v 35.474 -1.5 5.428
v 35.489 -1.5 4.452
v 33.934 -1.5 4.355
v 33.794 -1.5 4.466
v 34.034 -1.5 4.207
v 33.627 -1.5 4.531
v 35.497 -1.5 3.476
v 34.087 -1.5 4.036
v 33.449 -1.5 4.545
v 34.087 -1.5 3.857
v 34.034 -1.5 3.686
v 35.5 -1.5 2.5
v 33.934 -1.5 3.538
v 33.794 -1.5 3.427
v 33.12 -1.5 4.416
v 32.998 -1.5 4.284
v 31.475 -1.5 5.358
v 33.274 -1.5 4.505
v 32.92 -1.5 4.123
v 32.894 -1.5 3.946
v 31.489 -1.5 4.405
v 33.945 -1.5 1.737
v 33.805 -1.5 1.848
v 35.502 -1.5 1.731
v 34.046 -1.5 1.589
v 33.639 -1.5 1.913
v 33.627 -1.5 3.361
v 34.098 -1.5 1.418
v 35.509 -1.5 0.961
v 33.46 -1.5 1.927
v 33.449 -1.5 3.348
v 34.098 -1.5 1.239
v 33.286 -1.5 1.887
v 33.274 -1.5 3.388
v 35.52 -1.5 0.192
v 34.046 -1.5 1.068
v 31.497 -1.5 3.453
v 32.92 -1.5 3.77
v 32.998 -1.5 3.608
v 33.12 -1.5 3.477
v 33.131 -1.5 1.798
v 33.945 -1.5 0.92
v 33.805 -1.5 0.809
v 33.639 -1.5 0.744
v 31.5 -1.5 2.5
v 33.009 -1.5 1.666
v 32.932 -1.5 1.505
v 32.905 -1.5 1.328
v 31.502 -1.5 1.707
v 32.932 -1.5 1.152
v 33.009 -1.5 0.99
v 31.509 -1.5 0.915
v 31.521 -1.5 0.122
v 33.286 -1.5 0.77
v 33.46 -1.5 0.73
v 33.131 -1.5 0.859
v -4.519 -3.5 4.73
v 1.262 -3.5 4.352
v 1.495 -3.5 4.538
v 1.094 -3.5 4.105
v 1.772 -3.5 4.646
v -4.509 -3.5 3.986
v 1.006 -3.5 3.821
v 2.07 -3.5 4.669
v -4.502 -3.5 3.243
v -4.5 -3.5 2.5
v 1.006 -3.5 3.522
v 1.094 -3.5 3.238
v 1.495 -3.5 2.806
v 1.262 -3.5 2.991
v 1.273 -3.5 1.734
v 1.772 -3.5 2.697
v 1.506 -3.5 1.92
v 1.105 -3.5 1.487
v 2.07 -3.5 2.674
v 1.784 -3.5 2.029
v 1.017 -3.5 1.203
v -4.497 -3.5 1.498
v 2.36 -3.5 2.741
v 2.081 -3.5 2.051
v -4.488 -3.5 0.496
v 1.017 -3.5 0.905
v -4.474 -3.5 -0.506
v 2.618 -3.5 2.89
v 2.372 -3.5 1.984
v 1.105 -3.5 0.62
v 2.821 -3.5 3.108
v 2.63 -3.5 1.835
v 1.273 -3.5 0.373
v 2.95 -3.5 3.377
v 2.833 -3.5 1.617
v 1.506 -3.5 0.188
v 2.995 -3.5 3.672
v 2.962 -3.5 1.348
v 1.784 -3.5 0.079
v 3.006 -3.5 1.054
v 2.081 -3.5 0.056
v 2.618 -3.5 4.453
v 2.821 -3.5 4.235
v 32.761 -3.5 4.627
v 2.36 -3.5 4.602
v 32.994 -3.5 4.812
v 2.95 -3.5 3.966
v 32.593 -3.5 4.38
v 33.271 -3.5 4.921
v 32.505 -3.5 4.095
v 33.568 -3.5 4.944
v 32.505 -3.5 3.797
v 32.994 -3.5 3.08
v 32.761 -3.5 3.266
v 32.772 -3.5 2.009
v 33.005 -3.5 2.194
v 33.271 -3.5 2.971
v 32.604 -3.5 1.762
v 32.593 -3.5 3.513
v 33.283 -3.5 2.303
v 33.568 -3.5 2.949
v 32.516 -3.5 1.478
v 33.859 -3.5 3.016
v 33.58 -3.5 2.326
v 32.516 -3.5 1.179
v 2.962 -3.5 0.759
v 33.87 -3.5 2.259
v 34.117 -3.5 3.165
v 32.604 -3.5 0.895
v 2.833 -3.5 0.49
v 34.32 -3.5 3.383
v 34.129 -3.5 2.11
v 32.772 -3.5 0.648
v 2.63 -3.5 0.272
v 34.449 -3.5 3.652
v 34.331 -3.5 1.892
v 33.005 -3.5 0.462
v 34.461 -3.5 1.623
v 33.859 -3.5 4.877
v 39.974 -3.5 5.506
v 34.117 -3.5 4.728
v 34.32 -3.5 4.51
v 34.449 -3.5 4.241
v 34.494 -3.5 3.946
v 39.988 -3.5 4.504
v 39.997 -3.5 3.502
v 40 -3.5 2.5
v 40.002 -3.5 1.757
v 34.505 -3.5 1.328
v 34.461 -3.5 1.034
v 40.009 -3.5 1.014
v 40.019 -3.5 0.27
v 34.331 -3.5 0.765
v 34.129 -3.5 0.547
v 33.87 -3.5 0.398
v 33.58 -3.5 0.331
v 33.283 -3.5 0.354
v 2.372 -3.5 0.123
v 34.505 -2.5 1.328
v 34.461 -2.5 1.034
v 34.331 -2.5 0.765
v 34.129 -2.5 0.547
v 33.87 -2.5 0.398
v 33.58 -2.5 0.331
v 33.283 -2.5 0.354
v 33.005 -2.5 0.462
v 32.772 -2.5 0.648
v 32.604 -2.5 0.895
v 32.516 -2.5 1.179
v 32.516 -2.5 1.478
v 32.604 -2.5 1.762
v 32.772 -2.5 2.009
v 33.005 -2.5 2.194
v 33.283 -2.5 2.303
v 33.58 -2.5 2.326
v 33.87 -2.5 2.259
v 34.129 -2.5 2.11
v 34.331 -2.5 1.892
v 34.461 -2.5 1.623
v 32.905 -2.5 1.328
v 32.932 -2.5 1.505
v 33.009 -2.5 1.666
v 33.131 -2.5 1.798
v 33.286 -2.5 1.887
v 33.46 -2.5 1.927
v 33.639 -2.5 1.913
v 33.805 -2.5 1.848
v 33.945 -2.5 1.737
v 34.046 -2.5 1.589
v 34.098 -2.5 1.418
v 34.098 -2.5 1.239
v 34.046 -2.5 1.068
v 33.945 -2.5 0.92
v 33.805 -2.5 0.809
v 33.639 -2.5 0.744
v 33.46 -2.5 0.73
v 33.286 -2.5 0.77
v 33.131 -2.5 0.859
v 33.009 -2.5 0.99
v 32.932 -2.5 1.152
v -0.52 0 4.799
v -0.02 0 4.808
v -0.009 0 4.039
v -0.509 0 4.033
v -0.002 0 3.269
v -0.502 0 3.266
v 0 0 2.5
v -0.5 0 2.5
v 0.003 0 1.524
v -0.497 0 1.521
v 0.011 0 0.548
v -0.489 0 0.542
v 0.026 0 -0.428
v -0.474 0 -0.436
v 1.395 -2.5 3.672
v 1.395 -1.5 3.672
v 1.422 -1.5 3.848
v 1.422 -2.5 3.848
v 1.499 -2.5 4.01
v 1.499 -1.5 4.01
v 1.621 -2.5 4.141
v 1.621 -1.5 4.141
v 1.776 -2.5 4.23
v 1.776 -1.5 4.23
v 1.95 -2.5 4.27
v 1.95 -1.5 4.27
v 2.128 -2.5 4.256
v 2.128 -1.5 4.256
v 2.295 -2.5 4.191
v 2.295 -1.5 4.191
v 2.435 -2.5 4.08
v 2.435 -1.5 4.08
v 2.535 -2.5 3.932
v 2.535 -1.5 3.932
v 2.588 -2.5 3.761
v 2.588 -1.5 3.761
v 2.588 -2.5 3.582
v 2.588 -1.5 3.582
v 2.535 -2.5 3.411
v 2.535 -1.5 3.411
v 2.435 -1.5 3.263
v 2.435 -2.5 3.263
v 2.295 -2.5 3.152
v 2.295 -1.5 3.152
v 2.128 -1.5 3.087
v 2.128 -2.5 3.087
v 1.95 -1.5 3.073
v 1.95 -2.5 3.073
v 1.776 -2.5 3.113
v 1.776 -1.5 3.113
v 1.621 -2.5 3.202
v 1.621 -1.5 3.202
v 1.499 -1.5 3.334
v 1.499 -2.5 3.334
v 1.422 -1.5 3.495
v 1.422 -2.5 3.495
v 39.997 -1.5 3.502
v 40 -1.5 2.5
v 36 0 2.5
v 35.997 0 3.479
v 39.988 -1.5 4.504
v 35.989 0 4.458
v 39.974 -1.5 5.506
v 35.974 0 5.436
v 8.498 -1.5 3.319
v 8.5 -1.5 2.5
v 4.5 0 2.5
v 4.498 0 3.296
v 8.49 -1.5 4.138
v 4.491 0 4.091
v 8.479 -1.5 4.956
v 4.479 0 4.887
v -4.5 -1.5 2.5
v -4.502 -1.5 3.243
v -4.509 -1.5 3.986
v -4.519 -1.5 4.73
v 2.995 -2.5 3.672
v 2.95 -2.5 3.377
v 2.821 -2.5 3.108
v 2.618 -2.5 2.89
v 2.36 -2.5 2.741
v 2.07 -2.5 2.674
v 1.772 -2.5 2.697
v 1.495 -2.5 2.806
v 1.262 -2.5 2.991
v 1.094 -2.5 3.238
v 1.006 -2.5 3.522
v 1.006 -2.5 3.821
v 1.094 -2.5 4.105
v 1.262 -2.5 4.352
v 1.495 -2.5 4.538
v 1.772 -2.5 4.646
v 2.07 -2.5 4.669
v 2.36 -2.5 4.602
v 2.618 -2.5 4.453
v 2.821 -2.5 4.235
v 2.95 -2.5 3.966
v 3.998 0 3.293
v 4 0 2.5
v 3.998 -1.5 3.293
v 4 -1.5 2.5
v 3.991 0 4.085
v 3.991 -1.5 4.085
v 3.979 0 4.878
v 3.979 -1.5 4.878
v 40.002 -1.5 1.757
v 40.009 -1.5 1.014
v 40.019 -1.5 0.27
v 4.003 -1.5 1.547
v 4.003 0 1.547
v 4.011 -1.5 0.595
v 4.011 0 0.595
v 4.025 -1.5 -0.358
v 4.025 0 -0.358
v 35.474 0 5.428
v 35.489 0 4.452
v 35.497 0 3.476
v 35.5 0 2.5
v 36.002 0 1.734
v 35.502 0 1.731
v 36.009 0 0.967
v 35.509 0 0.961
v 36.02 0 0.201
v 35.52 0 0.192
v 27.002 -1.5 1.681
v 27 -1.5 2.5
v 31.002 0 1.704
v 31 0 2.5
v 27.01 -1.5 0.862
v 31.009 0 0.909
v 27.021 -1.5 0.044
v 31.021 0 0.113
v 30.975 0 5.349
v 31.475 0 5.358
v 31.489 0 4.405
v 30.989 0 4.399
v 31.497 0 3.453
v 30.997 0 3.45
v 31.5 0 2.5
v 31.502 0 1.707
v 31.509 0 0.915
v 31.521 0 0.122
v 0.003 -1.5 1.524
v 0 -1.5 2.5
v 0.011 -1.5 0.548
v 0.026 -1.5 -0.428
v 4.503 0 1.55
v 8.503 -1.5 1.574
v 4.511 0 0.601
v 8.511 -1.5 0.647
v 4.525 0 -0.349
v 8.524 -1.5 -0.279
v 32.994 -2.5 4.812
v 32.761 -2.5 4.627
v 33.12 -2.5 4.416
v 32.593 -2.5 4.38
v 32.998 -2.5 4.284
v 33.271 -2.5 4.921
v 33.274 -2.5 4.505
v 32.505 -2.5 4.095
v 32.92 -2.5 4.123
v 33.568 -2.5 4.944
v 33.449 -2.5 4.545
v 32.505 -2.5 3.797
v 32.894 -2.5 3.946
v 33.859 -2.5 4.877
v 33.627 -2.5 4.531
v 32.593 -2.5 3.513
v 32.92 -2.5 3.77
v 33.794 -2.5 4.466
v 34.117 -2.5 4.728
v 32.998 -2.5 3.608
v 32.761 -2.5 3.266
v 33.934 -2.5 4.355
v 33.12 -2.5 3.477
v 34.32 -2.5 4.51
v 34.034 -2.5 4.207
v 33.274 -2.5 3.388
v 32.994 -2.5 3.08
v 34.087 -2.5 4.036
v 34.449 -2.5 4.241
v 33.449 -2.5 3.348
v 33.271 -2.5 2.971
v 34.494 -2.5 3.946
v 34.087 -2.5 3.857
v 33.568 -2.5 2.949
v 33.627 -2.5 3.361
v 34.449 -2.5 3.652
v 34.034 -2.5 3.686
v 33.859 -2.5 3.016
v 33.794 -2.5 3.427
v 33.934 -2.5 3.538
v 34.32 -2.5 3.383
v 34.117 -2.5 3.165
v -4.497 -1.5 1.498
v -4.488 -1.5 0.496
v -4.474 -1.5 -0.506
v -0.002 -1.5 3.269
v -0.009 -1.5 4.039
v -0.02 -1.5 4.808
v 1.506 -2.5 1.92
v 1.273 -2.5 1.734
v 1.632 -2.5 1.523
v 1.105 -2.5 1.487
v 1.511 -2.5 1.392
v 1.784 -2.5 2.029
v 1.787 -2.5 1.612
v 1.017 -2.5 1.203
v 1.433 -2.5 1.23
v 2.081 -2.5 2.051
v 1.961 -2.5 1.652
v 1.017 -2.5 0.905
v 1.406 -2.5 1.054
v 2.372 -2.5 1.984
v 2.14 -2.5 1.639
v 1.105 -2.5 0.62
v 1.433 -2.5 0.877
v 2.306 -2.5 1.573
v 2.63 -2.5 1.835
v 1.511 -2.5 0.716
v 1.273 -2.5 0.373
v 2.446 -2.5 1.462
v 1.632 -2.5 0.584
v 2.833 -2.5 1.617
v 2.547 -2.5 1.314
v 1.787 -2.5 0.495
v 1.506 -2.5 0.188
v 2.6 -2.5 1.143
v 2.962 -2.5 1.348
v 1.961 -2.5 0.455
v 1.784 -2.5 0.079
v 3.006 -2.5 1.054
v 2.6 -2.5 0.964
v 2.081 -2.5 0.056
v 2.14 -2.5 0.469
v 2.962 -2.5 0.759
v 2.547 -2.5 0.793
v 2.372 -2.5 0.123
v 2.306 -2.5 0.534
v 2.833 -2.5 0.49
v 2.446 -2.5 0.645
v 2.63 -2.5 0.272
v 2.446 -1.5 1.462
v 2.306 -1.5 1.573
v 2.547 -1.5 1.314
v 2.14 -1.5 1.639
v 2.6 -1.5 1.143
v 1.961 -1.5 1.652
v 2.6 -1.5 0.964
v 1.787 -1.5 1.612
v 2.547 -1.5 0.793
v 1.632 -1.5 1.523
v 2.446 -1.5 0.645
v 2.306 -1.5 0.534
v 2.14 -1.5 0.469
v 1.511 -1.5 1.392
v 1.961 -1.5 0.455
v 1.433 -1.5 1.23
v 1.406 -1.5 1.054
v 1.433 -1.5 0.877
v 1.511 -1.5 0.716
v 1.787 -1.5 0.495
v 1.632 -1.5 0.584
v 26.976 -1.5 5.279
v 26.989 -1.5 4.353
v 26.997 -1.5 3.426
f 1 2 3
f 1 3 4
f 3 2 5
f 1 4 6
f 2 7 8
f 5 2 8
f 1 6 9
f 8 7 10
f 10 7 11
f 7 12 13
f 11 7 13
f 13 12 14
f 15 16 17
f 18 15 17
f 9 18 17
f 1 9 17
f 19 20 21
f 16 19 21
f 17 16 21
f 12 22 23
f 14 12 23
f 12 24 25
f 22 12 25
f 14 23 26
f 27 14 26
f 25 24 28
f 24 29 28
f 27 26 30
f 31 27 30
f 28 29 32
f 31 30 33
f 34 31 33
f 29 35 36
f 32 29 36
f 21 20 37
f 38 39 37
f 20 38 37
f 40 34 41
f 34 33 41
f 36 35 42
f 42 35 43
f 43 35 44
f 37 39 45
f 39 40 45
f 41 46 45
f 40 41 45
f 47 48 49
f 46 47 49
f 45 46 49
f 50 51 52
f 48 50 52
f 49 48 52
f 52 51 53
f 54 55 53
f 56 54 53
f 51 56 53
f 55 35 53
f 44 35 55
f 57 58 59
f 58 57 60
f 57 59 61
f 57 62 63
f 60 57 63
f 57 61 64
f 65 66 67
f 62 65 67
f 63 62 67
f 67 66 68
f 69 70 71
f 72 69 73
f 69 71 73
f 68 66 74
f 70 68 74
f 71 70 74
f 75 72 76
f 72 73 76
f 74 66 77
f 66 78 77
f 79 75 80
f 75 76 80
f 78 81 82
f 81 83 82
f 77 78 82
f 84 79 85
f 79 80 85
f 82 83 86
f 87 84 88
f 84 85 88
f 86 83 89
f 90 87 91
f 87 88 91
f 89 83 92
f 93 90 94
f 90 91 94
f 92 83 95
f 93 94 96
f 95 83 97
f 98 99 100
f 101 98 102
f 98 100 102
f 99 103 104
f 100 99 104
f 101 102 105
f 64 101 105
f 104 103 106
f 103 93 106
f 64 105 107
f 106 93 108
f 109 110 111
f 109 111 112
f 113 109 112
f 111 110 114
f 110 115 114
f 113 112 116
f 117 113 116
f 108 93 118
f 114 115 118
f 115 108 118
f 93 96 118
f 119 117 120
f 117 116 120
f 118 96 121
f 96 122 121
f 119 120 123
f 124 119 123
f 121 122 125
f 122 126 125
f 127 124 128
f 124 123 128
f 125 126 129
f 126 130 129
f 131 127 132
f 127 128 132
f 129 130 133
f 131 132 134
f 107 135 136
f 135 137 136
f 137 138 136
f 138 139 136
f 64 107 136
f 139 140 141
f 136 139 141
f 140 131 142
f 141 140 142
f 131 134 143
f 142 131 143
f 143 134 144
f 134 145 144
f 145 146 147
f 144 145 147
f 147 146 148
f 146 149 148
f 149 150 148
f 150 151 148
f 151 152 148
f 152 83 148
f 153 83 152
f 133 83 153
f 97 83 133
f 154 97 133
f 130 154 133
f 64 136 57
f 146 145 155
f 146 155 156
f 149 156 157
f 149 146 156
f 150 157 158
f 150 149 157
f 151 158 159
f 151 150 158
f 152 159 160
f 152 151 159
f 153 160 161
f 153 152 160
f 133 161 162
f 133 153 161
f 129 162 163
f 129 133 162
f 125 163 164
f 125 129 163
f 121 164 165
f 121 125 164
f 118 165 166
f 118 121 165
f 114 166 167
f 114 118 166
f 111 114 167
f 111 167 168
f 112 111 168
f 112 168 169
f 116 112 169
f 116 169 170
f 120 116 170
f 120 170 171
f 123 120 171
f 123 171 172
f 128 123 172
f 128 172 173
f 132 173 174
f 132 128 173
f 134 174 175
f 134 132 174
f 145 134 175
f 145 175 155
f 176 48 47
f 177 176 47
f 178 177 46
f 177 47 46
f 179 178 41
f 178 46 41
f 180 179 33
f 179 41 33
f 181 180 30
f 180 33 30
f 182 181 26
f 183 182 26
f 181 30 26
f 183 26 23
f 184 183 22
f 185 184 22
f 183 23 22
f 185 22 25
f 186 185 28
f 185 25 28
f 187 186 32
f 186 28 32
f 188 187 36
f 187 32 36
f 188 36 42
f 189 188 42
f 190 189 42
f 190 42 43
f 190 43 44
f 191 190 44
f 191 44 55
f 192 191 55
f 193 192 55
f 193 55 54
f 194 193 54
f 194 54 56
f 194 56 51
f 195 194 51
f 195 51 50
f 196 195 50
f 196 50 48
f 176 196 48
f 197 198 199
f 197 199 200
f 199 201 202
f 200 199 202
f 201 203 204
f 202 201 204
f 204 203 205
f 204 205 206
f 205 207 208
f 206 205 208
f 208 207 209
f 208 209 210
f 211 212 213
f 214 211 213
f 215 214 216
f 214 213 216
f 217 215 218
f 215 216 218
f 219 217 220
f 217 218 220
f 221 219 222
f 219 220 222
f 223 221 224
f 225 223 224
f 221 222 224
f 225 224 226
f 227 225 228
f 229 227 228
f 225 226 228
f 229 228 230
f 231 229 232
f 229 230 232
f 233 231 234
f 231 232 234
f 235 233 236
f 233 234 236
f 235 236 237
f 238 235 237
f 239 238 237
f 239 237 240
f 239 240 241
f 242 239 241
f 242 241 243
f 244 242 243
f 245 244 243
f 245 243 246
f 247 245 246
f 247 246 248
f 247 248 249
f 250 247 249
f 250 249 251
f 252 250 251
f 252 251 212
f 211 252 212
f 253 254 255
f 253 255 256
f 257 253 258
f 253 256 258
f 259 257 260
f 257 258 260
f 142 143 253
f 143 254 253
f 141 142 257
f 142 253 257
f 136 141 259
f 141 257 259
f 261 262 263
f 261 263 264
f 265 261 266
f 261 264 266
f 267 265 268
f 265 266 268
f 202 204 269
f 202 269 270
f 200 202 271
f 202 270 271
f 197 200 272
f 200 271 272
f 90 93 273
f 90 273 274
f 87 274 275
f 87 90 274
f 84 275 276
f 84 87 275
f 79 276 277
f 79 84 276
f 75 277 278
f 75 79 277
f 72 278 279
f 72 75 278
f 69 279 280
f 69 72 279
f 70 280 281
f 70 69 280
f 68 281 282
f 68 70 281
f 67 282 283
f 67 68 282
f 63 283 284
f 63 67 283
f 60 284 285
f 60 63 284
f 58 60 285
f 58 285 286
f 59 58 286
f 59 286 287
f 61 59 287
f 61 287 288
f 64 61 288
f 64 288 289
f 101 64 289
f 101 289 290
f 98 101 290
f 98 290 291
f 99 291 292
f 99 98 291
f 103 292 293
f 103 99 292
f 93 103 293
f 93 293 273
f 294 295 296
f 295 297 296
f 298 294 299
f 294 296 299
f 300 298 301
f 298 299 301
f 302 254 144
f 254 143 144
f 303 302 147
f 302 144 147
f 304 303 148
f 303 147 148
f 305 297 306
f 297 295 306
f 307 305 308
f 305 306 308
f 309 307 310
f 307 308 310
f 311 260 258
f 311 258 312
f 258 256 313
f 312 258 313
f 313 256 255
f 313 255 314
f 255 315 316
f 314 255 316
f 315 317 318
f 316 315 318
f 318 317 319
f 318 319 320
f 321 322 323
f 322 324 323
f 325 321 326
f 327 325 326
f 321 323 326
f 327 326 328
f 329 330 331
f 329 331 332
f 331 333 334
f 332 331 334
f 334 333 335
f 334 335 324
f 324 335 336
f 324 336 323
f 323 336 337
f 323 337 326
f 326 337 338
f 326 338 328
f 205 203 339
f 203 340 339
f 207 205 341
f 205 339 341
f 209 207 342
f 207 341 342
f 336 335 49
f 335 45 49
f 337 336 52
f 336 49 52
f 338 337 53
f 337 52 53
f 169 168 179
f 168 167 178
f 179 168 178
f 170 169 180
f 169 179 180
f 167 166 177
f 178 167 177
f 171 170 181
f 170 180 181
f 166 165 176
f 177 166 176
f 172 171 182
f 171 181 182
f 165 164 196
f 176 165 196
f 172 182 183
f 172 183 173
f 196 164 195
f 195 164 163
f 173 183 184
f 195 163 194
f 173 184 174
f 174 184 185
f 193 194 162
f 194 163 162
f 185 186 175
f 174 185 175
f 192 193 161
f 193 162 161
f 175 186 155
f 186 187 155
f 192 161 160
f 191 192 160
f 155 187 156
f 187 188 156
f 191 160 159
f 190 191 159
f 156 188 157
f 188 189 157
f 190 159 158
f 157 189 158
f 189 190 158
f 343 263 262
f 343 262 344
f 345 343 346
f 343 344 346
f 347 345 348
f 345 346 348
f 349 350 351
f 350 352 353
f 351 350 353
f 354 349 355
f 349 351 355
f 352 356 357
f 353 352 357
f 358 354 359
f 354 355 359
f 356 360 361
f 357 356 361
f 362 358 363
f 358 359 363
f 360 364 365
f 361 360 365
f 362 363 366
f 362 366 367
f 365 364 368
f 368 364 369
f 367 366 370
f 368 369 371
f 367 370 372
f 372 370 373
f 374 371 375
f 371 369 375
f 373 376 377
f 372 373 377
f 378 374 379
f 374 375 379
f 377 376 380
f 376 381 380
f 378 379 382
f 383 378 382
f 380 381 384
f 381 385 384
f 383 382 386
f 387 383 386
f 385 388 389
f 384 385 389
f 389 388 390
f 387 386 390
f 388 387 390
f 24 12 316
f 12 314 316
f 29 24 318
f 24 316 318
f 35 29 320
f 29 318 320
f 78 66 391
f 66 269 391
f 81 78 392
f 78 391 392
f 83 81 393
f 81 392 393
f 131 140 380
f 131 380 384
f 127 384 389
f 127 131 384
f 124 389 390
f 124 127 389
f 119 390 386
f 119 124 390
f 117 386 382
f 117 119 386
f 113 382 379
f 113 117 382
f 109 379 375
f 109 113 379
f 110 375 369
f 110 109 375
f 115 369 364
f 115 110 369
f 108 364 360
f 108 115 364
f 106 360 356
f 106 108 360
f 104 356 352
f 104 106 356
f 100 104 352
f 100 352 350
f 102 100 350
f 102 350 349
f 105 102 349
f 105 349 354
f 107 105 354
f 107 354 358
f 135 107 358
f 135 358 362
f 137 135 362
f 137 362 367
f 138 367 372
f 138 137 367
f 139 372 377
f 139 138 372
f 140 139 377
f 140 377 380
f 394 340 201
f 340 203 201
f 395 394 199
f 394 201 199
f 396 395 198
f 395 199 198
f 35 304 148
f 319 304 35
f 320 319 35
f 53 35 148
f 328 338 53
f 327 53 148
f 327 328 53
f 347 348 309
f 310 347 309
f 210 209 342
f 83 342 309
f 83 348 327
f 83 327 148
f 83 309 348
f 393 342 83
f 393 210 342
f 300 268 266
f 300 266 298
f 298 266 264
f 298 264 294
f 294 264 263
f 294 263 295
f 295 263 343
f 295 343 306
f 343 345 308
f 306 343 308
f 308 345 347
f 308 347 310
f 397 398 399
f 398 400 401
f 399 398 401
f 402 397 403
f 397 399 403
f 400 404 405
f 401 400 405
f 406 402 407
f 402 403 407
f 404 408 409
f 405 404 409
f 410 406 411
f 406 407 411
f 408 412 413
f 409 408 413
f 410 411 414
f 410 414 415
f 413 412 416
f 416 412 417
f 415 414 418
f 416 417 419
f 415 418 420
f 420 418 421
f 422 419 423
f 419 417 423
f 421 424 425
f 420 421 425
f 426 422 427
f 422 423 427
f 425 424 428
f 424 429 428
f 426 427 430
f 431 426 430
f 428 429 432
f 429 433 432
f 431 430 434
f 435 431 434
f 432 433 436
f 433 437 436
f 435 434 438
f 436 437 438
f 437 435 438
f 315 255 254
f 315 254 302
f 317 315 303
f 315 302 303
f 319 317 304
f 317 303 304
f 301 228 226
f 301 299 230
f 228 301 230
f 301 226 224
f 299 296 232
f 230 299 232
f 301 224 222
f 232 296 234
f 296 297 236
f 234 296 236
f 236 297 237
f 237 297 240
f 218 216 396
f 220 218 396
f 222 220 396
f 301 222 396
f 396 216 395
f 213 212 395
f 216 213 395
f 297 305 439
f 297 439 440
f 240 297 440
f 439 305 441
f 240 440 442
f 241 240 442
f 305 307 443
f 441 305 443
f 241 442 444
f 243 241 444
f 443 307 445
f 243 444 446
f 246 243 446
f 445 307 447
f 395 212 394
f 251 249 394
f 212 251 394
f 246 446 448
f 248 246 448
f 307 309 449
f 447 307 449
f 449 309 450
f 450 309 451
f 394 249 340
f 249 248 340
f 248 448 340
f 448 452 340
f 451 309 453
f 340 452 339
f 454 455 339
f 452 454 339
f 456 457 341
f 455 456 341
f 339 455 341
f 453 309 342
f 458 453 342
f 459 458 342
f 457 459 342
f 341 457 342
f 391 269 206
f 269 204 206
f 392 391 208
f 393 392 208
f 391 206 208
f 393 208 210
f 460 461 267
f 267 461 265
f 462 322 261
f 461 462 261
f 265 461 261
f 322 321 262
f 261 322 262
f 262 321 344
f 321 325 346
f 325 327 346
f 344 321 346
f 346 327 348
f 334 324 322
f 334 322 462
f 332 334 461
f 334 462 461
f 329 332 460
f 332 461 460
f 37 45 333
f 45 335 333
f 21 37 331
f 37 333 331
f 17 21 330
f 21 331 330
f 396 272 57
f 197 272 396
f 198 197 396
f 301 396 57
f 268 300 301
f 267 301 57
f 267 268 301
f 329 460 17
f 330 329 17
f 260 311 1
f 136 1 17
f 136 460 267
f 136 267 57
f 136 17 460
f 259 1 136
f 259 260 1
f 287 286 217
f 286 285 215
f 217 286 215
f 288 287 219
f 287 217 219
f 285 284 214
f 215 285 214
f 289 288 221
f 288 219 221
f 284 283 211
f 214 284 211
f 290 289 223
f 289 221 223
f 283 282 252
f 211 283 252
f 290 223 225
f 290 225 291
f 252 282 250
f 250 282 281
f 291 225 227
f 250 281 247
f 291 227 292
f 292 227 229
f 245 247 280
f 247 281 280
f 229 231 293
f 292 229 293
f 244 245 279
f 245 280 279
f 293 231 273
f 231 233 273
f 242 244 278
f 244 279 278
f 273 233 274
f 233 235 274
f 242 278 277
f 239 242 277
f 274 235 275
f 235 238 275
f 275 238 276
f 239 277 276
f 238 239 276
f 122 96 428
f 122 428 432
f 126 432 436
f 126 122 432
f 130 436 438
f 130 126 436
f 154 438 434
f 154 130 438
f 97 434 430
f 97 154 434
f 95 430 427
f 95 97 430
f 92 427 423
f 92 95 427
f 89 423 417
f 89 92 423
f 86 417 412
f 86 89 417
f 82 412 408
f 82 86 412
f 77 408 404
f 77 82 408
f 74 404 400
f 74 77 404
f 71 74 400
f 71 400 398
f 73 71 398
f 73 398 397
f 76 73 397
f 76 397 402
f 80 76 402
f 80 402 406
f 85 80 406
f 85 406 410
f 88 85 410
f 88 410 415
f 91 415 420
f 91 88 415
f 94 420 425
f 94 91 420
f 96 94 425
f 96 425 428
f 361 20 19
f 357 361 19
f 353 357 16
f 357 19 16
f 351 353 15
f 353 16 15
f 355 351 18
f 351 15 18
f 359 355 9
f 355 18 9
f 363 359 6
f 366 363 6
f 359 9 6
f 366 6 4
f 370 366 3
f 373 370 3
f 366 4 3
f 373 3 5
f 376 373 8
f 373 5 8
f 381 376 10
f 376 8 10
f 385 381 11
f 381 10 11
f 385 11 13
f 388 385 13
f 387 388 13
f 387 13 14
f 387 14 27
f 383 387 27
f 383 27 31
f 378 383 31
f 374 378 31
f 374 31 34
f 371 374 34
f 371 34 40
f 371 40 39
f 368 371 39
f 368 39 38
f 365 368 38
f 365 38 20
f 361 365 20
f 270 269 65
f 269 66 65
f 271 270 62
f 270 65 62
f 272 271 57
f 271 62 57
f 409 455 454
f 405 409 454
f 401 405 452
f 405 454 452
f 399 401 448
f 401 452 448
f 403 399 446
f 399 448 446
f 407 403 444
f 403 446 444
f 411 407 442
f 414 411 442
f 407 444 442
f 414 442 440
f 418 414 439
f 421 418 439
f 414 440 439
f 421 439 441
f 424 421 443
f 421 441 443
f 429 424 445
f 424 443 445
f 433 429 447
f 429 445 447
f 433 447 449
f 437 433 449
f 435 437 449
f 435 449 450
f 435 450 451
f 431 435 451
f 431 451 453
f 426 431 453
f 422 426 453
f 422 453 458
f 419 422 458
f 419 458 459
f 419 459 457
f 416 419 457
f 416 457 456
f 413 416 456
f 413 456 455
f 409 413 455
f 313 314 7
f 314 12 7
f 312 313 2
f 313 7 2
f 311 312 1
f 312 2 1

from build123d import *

# Parameters (mm, degrees)
EXTRUDE_1_DEPTH     = 2.5
SKETCH_5_R          = 0.6
CUT_EXTRUDE_1_DEPTH = 19.036421485
CUT_EXTRUDE_START   = -2
SKETCH_5_3_R        = 1
CUT_EXTRUDE_2_DEPTH = 1
REVOLVE_1_ANGLE     = 1
SKETCH_9_R          = 0.6
CUT_EXTRUDE_3_DEPTH = 41.426698916
SKETCH_9_3_R        = 1
CUT_EXTRUDE_4_DEPTH = 1
SKETCH_10_W         = 44.5
SKETCH_10_H         = 2.5
CUT_EXTRUDE_5_DEPTH = 41.528606999
REVOLVE_2_ANGLE     = 1
SKETCH_14_R         = 0.6
CUT_EXTRUDE_6_DEPTH = 41.445950592
SKETCH_14_3_R       = 1
CUT_EXTRUDE_7_DEPTH = 1


with BuildPart() as part:
    # 草图4 → 凸台-拉伸1 (new body)
    with BuildSketch(Plane.XY):
        Polygon((8.5, -1.5), (17.75, -1.5), (17.75, -3.5), (-4.5, -3.5), (-4.5, -1.5), (-0.5, 0), (0, 0), (0, -1.5), (4, -1.5), (4, 0), (4.5, 0), align=None)
    extrude(amount=EXTRUDE_1_DEPTH)

    # 草图5 → 切除-拉伸1 (cut, through all)
    with BuildSketch(Plane(origin=(0, -1.5, 0), x_dir=(1, 0, 0), z_dir=(0, 1, 0))):
        with Locations(Location((2, -1.25, 0), (0, 0, 270))):
            Circle(SKETCH_5_R)
    extrude(amount=-CUT_EXTRUDE_1_DEPTH, mode=Mode.SUBTRACT)

    # 草图5<3> → 切除-拉伸2 (cut)
    with BuildSketch(Plane(origin=(0, -1.5, 0), x_dir=(1, 0, 0), z_dir=(0, 1, 0)).offset(CUT_EXTRUDE_START)):
        with Locations((2, -1.25)):
            Circle(SKETCH_5_3_R)
    extrude(amount=CUT_EXTRUDE_2_DEPTH, mode=Mode.SUBTRACT)

    # 镜向1: part across plane


with BuildPart() as part_1:
    add(part.part)
    add(part.part.mirror(Plane(origin=(17.75, 0, 2.5), x_dir=(0, 0, 1), z_dir=(1, 0, 0))))

    # 草图6 → 旋转1 (revolve)
    with BuildSketch(Plane.XY.offset(2.5)):
        Polygon((0, 0), (-0.5, 0), (-4.5, -1.5), (-4.5, -3.5), (40, -3.5), (40, -1.5), (36, 0), (35.5, 0), (35.5, -1.5), (31.5, -1.5), (31.5, 0), (31, 0), (27, -1.5), (8.5, -1.5), (4.5, 0), (4, 0), (4, -1.5), (0, -1.5), align=None)
    revolve(axis=Axis((-132.25, 94.8535776, 2.5), (0, -1, 0)), revolution_arc=REVOLVE_1_ANGLE)

    # 草图9 → 切除-拉伸3 (cut, through all)
    with BuildSketch(Plane(origin=(0, -1.5, 0), x_dir=(1, 0, 0), z_dir=(0, 1, 0))):
        with Locations(Location((1.994888171, -3.671537391, 0), (0, 0, 180))):
            Circle(SKETCH_9_R)
        with Locations(Location((33.493688748, -3.946423259, 0), (0, 0, 180))):
            Circle(SKETCH_9_R)
    extrude(amount=-CUT_EXTRUDE_3_DEPTH, mode=Mode.SUBTRACT)

    # 草图9<3> → 切除-拉伸4 (cut)
    with BuildSketch(Plane(origin=(0, -1.5, 0), x_dir=(1, 0, 0), z_dir=(0, 1, 0)).offset(CUT_EXTRUDE_START)):
        with Locations((1.994888171, -3.671537391)):
            Circle(SKETCH_9_3_R)
        with Locations((33.493688748, -3.946423259)):
            Circle(SKETCH_9_3_R)
    extrude(amount=CUT_EXTRUDE_4_DEPTH, mode=Mode.SUBTRACT)

    # 草图10 → 切除-拉伸5 (cut, through all)
    with BuildSketch(Plane(origin=(0, 0, 0), x_dir=(1, 0, 0), z_dir=(0, 1, 0))):
        with Locations((17.75, -1.25)):
            Rectangle(SKETCH_10_W, SKETCH_10_H)
    extrude(amount=-CUT_EXTRUDE_5_DEPTH, mode=Mode.SUBTRACT)

    # 草图11 → 旋转2 (revolve)
    with BuildSketch(Plane(origin=(0, 0, 2.5), x_dir=(-1, 0, 0), z_dir=(0, 0, -1))):
        Polygon((0.5, 0), (0, 0), (0, -1.5), (-4, -1.5), (-4, 0), (-4.5, 0), (-8.5, -1.5), (-27, -1.5), (-31, 0), (-31.5, 0), (-31.5, -1.5), (-35.5, -1.5), (-35.5, 0), (-36, 0), (-40, -1.5), (-40, -3.5), (4.5, -3.5), (4.5, -1.5), align=None)
    revolve(axis=Axis((167.75, 63.011743597, 2.5), (0, -1, 0)), revolution_arc=REVOLVE_2_ANGLE)

    # 草图14 → 切除-拉伸6 (cut, through all)
    with BuildSketch(Plane(origin=(0, -1.5, 0), x_dir=(1, 0, 0), z_dir=(0, 1, 0))):
        with Locations(Location((2.006311252, -1.053576741, 0), (0, 0, 180))):
            Circle(SKETCH_14_R)
        with Locations(Location((33.505111829, -1.328462609, 0), (0, 0, 180))):
            Circle(SKETCH_14_R)
    extrude(amount=-CUT_EXTRUDE_6_DEPTH, mode=Mode.SUBTRACT)

    # 草图14<3> → 切除-拉伸7 (cut)
    with BuildSketch(Plane(origin=(0, -1.5, 0), x_dir=(1, 0, 0), z_dir=(0, 1, 0)).offset(CUT_EXTRUDE_START)):
        with Locations((2.006311252, -1.053576741)):
            Circle(SKETCH_14_3_R)
        with Locations((33.505111829, -1.328462609)):
            Circle(SKETCH_14_3_R)
    extrude(amount=CUT_EXTRUDE_7_DEPTH, mode=Mode.SUBTRACT)


solid = part_1.part
